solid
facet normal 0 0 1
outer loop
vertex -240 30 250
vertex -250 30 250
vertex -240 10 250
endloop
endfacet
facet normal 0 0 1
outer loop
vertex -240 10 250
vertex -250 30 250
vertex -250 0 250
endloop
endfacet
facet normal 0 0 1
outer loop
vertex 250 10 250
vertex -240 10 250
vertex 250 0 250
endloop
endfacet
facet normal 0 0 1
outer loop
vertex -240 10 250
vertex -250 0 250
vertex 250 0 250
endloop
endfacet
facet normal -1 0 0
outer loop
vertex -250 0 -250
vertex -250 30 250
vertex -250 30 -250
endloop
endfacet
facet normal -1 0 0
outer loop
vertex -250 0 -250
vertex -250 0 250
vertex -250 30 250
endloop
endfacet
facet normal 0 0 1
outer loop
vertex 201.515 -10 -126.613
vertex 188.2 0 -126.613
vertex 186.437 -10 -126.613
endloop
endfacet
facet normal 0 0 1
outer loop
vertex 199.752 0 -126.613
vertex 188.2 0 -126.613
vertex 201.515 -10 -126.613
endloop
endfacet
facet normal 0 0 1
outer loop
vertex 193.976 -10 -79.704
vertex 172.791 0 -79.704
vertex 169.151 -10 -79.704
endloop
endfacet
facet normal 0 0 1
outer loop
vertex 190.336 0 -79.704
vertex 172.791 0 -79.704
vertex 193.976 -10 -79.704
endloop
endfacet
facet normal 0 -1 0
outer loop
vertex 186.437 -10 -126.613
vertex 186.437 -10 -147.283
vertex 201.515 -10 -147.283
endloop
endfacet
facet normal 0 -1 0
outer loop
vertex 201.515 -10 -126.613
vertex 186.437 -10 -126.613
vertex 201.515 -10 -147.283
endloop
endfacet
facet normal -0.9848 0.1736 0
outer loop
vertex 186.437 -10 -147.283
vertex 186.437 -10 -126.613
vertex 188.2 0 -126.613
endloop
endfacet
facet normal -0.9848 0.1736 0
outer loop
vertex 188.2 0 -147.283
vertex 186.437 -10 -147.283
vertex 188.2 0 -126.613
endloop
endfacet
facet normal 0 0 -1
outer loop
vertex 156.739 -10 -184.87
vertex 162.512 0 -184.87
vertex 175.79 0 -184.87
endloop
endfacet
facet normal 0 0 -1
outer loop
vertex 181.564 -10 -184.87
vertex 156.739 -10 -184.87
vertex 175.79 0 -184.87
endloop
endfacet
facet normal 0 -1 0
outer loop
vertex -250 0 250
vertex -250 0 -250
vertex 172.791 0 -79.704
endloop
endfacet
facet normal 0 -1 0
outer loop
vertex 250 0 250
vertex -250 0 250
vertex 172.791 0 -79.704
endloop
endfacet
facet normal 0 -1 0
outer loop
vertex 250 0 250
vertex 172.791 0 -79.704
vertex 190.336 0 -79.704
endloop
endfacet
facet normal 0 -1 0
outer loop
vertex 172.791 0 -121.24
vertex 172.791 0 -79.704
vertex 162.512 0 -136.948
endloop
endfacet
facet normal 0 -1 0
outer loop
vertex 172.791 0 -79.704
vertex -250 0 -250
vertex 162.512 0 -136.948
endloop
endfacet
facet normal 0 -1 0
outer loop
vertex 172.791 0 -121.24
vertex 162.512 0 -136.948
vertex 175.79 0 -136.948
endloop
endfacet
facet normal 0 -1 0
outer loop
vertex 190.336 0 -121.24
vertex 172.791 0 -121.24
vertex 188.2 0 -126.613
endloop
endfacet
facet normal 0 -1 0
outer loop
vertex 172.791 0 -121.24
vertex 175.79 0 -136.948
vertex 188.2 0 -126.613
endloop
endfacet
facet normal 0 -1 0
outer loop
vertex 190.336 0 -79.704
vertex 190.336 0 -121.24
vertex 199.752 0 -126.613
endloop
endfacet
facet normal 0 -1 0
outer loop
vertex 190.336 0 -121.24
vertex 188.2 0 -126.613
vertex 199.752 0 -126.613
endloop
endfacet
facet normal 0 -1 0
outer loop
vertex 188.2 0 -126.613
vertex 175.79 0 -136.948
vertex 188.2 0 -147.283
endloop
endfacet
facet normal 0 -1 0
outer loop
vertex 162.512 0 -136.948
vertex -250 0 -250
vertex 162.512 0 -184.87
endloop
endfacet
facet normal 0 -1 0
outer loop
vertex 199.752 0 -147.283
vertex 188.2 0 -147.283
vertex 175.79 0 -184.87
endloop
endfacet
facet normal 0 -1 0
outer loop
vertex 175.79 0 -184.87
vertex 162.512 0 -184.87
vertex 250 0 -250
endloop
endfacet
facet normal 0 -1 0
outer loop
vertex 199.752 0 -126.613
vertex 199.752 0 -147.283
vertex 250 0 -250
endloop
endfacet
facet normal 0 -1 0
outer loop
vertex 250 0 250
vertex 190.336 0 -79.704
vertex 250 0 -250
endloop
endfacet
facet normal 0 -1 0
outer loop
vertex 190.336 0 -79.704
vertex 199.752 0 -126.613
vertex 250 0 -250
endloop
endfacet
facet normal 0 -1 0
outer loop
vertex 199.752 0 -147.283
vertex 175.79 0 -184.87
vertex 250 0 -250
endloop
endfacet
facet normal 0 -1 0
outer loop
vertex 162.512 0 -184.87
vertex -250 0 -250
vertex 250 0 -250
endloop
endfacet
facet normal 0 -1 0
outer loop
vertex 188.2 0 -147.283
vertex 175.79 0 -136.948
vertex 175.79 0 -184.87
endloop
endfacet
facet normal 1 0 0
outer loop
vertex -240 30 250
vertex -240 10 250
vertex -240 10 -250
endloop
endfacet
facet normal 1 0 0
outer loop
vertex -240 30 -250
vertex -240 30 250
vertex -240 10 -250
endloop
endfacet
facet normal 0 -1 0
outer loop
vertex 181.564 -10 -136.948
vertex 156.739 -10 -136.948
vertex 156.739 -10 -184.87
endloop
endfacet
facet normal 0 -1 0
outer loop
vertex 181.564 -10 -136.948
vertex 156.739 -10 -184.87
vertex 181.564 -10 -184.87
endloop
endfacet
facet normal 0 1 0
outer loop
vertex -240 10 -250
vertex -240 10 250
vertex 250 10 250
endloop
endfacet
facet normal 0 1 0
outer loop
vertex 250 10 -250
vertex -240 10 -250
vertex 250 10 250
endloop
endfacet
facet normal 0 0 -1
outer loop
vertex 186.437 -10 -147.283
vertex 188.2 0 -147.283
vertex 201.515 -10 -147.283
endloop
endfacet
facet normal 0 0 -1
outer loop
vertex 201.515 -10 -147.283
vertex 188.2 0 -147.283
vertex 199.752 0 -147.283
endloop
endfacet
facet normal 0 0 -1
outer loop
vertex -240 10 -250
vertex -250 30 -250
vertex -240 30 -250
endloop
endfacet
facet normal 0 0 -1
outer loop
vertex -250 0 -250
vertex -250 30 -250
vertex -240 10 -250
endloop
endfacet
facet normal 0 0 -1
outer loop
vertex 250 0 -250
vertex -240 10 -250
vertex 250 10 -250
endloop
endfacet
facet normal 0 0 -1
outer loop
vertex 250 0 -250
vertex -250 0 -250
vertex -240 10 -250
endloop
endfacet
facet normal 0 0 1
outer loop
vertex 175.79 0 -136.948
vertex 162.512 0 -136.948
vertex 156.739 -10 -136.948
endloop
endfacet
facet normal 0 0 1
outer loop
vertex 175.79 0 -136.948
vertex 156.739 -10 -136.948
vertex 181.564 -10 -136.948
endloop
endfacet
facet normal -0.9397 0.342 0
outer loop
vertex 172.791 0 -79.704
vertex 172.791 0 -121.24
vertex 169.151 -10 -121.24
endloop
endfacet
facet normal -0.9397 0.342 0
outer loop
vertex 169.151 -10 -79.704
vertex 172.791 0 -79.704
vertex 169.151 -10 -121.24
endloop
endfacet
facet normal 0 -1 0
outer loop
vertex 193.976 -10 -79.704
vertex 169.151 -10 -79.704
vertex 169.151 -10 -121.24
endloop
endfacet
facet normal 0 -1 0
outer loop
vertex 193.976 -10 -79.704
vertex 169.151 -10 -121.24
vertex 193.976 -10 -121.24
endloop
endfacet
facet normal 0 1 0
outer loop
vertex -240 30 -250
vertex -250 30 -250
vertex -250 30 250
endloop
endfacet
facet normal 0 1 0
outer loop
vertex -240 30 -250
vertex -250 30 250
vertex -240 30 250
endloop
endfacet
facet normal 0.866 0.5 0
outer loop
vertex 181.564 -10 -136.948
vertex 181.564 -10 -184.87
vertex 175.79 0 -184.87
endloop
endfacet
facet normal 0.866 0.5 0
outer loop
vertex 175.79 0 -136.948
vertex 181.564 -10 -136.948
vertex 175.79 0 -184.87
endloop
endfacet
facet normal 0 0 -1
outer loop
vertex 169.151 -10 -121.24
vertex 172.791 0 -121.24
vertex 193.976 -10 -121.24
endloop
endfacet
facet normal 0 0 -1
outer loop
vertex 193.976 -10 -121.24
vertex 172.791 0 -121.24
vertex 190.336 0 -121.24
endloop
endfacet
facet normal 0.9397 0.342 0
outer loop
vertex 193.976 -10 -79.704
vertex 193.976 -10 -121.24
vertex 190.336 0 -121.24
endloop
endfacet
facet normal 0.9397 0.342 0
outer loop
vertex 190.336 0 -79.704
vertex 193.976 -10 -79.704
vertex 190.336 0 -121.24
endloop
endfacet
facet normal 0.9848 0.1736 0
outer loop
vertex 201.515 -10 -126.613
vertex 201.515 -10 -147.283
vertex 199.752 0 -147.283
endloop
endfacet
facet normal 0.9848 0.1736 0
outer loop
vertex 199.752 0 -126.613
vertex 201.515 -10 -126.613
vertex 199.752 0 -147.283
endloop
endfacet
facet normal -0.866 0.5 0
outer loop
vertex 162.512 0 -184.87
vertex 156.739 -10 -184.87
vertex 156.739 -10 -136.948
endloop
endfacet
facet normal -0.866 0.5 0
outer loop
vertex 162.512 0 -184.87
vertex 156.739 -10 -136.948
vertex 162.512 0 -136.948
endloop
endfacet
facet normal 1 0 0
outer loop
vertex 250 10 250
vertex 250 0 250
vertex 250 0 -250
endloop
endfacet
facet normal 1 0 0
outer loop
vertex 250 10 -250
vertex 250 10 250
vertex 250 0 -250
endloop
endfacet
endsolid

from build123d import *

# Parameters (mm, degrees)
SKETCH1_W           = 500
SKETCH1_H           = 500
BOSS_EXTRUDE1_DEPTH = 10
SKETCH2_W           = 10
SKETCH2_H           = 500
BOSS_EXTRUDE2_DEPTH = 20
SKETCH3_W           = 24.824794579
SKETCH3_H           = 41.535737198
SKETCH3_H_2         = 47.922361064
SKETCH3_W_2         = 15.07825301
SKETCH3_H_3         = 20.670620926
BOSS_EXTRUDE3_DEPTH = 10
CUT_EXTRUDE4_DEPTH  = 50
CUT_EXTRUDE5_DEPTH  = 50
CUT_EXTRUDE6_DEPTH  = 22


with BuildPart() as part:
    # Sketch1 → Boss-Extrude1 (new body)
    with BuildSketch(Plane(origin=(0, 0, 0), x_dir=(1, 0, 0), z_dir=(0, 1, 0))):
        Rectangle(SKETCH1_W, SKETCH1_H)
    extrude(amount=BOSS_EXTRUDE1_DEPTH)

    # Sketch2 → Boss-Extrude2 (add)
    with BuildSketch(Plane(origin=(0, 10, 0), x_dir=(1, 0, 0), z_dir=(0, 1, 0))):
        with Locations((-245, 0)):
            Rectangle(SKETCH2_W, SKETCH2_H)
    extrude(amount=BOSS_EXTRUDE2_DEPTH)

    # Sketch3 → Boss-Extrude3 (add)
    with BuildSketch(Plane.XZ):
        with Locations((181.563787456, -100.472088386)):
            Rectangle(SKETCH3_W, SKETCH3_H)
        with Locations((169.151390168, -160.909121908)):
            Rectangle(SKETCH3_W, SKETCH3_H_2)
        with Locations((193.976184746, -136.947941376)):
            Rectangle(SKETCH3_W_2, SKETCH3_H_3)
    extrude(amount=BOSS_EXTRUDE3_DEPTH)

    # Sketch6 → Cut-Extrude4 (cut)
    with BuildSketch(Plane(origin=(0, 0, -184.87030244), x_dir=(-1, 0, 0), z_dir=(0, 0, -1))):
        Polygon((-156.738992878, -10), (-162.512495569, 0), (-156.738992878, 0), align=None)
        Polygon((-175.790284765, 0), (-181.563787457, 0), (-181.563787457, -10), align=None)
    extrude(amount=-CUT_EXTRUDE4_DEPTH, mode=Mode.SUBTRACT)

    # Sketch5 → Cut-Extrude5 (cut)
    with BuildSketch(Plane(origin=(0, 0, -121.239956985), x_dir=(-1, 0, 0), z_dir=(0, 0, -1))):
        Polygon((-172.79109251, 0), (-169.151390167, -10), (-169.151390167, 0), align=None)
        Polygon((-193.976184746, -10), (-190.336482403, 0), (-193.976184746, 0), align=None)
    extrude(amount=-CUT_EXTRUDE5_DEPTH, mode=Mode.SUBTRACT)

    # Sketch4 → Cut-Extrude6 (cut)
    with BuildSketch(Plane(origin=(0, 0, -147.283251839), x_dir=(-1, 0, 0), z_dir=(0, 0, -1))):
        Polygon((-186.437058241, -10), (-188.200328049, 0), (-186.437058241, 0), align=None)
        Polygon((-199.752041444, 0), (-201.515311251, 0), (-201.515311251, -10), align=None)
    extrude(amount=-CUT_EXTRUDE6_DEPTH, mode=Mode.SUBTRACT)


solid = part.part
